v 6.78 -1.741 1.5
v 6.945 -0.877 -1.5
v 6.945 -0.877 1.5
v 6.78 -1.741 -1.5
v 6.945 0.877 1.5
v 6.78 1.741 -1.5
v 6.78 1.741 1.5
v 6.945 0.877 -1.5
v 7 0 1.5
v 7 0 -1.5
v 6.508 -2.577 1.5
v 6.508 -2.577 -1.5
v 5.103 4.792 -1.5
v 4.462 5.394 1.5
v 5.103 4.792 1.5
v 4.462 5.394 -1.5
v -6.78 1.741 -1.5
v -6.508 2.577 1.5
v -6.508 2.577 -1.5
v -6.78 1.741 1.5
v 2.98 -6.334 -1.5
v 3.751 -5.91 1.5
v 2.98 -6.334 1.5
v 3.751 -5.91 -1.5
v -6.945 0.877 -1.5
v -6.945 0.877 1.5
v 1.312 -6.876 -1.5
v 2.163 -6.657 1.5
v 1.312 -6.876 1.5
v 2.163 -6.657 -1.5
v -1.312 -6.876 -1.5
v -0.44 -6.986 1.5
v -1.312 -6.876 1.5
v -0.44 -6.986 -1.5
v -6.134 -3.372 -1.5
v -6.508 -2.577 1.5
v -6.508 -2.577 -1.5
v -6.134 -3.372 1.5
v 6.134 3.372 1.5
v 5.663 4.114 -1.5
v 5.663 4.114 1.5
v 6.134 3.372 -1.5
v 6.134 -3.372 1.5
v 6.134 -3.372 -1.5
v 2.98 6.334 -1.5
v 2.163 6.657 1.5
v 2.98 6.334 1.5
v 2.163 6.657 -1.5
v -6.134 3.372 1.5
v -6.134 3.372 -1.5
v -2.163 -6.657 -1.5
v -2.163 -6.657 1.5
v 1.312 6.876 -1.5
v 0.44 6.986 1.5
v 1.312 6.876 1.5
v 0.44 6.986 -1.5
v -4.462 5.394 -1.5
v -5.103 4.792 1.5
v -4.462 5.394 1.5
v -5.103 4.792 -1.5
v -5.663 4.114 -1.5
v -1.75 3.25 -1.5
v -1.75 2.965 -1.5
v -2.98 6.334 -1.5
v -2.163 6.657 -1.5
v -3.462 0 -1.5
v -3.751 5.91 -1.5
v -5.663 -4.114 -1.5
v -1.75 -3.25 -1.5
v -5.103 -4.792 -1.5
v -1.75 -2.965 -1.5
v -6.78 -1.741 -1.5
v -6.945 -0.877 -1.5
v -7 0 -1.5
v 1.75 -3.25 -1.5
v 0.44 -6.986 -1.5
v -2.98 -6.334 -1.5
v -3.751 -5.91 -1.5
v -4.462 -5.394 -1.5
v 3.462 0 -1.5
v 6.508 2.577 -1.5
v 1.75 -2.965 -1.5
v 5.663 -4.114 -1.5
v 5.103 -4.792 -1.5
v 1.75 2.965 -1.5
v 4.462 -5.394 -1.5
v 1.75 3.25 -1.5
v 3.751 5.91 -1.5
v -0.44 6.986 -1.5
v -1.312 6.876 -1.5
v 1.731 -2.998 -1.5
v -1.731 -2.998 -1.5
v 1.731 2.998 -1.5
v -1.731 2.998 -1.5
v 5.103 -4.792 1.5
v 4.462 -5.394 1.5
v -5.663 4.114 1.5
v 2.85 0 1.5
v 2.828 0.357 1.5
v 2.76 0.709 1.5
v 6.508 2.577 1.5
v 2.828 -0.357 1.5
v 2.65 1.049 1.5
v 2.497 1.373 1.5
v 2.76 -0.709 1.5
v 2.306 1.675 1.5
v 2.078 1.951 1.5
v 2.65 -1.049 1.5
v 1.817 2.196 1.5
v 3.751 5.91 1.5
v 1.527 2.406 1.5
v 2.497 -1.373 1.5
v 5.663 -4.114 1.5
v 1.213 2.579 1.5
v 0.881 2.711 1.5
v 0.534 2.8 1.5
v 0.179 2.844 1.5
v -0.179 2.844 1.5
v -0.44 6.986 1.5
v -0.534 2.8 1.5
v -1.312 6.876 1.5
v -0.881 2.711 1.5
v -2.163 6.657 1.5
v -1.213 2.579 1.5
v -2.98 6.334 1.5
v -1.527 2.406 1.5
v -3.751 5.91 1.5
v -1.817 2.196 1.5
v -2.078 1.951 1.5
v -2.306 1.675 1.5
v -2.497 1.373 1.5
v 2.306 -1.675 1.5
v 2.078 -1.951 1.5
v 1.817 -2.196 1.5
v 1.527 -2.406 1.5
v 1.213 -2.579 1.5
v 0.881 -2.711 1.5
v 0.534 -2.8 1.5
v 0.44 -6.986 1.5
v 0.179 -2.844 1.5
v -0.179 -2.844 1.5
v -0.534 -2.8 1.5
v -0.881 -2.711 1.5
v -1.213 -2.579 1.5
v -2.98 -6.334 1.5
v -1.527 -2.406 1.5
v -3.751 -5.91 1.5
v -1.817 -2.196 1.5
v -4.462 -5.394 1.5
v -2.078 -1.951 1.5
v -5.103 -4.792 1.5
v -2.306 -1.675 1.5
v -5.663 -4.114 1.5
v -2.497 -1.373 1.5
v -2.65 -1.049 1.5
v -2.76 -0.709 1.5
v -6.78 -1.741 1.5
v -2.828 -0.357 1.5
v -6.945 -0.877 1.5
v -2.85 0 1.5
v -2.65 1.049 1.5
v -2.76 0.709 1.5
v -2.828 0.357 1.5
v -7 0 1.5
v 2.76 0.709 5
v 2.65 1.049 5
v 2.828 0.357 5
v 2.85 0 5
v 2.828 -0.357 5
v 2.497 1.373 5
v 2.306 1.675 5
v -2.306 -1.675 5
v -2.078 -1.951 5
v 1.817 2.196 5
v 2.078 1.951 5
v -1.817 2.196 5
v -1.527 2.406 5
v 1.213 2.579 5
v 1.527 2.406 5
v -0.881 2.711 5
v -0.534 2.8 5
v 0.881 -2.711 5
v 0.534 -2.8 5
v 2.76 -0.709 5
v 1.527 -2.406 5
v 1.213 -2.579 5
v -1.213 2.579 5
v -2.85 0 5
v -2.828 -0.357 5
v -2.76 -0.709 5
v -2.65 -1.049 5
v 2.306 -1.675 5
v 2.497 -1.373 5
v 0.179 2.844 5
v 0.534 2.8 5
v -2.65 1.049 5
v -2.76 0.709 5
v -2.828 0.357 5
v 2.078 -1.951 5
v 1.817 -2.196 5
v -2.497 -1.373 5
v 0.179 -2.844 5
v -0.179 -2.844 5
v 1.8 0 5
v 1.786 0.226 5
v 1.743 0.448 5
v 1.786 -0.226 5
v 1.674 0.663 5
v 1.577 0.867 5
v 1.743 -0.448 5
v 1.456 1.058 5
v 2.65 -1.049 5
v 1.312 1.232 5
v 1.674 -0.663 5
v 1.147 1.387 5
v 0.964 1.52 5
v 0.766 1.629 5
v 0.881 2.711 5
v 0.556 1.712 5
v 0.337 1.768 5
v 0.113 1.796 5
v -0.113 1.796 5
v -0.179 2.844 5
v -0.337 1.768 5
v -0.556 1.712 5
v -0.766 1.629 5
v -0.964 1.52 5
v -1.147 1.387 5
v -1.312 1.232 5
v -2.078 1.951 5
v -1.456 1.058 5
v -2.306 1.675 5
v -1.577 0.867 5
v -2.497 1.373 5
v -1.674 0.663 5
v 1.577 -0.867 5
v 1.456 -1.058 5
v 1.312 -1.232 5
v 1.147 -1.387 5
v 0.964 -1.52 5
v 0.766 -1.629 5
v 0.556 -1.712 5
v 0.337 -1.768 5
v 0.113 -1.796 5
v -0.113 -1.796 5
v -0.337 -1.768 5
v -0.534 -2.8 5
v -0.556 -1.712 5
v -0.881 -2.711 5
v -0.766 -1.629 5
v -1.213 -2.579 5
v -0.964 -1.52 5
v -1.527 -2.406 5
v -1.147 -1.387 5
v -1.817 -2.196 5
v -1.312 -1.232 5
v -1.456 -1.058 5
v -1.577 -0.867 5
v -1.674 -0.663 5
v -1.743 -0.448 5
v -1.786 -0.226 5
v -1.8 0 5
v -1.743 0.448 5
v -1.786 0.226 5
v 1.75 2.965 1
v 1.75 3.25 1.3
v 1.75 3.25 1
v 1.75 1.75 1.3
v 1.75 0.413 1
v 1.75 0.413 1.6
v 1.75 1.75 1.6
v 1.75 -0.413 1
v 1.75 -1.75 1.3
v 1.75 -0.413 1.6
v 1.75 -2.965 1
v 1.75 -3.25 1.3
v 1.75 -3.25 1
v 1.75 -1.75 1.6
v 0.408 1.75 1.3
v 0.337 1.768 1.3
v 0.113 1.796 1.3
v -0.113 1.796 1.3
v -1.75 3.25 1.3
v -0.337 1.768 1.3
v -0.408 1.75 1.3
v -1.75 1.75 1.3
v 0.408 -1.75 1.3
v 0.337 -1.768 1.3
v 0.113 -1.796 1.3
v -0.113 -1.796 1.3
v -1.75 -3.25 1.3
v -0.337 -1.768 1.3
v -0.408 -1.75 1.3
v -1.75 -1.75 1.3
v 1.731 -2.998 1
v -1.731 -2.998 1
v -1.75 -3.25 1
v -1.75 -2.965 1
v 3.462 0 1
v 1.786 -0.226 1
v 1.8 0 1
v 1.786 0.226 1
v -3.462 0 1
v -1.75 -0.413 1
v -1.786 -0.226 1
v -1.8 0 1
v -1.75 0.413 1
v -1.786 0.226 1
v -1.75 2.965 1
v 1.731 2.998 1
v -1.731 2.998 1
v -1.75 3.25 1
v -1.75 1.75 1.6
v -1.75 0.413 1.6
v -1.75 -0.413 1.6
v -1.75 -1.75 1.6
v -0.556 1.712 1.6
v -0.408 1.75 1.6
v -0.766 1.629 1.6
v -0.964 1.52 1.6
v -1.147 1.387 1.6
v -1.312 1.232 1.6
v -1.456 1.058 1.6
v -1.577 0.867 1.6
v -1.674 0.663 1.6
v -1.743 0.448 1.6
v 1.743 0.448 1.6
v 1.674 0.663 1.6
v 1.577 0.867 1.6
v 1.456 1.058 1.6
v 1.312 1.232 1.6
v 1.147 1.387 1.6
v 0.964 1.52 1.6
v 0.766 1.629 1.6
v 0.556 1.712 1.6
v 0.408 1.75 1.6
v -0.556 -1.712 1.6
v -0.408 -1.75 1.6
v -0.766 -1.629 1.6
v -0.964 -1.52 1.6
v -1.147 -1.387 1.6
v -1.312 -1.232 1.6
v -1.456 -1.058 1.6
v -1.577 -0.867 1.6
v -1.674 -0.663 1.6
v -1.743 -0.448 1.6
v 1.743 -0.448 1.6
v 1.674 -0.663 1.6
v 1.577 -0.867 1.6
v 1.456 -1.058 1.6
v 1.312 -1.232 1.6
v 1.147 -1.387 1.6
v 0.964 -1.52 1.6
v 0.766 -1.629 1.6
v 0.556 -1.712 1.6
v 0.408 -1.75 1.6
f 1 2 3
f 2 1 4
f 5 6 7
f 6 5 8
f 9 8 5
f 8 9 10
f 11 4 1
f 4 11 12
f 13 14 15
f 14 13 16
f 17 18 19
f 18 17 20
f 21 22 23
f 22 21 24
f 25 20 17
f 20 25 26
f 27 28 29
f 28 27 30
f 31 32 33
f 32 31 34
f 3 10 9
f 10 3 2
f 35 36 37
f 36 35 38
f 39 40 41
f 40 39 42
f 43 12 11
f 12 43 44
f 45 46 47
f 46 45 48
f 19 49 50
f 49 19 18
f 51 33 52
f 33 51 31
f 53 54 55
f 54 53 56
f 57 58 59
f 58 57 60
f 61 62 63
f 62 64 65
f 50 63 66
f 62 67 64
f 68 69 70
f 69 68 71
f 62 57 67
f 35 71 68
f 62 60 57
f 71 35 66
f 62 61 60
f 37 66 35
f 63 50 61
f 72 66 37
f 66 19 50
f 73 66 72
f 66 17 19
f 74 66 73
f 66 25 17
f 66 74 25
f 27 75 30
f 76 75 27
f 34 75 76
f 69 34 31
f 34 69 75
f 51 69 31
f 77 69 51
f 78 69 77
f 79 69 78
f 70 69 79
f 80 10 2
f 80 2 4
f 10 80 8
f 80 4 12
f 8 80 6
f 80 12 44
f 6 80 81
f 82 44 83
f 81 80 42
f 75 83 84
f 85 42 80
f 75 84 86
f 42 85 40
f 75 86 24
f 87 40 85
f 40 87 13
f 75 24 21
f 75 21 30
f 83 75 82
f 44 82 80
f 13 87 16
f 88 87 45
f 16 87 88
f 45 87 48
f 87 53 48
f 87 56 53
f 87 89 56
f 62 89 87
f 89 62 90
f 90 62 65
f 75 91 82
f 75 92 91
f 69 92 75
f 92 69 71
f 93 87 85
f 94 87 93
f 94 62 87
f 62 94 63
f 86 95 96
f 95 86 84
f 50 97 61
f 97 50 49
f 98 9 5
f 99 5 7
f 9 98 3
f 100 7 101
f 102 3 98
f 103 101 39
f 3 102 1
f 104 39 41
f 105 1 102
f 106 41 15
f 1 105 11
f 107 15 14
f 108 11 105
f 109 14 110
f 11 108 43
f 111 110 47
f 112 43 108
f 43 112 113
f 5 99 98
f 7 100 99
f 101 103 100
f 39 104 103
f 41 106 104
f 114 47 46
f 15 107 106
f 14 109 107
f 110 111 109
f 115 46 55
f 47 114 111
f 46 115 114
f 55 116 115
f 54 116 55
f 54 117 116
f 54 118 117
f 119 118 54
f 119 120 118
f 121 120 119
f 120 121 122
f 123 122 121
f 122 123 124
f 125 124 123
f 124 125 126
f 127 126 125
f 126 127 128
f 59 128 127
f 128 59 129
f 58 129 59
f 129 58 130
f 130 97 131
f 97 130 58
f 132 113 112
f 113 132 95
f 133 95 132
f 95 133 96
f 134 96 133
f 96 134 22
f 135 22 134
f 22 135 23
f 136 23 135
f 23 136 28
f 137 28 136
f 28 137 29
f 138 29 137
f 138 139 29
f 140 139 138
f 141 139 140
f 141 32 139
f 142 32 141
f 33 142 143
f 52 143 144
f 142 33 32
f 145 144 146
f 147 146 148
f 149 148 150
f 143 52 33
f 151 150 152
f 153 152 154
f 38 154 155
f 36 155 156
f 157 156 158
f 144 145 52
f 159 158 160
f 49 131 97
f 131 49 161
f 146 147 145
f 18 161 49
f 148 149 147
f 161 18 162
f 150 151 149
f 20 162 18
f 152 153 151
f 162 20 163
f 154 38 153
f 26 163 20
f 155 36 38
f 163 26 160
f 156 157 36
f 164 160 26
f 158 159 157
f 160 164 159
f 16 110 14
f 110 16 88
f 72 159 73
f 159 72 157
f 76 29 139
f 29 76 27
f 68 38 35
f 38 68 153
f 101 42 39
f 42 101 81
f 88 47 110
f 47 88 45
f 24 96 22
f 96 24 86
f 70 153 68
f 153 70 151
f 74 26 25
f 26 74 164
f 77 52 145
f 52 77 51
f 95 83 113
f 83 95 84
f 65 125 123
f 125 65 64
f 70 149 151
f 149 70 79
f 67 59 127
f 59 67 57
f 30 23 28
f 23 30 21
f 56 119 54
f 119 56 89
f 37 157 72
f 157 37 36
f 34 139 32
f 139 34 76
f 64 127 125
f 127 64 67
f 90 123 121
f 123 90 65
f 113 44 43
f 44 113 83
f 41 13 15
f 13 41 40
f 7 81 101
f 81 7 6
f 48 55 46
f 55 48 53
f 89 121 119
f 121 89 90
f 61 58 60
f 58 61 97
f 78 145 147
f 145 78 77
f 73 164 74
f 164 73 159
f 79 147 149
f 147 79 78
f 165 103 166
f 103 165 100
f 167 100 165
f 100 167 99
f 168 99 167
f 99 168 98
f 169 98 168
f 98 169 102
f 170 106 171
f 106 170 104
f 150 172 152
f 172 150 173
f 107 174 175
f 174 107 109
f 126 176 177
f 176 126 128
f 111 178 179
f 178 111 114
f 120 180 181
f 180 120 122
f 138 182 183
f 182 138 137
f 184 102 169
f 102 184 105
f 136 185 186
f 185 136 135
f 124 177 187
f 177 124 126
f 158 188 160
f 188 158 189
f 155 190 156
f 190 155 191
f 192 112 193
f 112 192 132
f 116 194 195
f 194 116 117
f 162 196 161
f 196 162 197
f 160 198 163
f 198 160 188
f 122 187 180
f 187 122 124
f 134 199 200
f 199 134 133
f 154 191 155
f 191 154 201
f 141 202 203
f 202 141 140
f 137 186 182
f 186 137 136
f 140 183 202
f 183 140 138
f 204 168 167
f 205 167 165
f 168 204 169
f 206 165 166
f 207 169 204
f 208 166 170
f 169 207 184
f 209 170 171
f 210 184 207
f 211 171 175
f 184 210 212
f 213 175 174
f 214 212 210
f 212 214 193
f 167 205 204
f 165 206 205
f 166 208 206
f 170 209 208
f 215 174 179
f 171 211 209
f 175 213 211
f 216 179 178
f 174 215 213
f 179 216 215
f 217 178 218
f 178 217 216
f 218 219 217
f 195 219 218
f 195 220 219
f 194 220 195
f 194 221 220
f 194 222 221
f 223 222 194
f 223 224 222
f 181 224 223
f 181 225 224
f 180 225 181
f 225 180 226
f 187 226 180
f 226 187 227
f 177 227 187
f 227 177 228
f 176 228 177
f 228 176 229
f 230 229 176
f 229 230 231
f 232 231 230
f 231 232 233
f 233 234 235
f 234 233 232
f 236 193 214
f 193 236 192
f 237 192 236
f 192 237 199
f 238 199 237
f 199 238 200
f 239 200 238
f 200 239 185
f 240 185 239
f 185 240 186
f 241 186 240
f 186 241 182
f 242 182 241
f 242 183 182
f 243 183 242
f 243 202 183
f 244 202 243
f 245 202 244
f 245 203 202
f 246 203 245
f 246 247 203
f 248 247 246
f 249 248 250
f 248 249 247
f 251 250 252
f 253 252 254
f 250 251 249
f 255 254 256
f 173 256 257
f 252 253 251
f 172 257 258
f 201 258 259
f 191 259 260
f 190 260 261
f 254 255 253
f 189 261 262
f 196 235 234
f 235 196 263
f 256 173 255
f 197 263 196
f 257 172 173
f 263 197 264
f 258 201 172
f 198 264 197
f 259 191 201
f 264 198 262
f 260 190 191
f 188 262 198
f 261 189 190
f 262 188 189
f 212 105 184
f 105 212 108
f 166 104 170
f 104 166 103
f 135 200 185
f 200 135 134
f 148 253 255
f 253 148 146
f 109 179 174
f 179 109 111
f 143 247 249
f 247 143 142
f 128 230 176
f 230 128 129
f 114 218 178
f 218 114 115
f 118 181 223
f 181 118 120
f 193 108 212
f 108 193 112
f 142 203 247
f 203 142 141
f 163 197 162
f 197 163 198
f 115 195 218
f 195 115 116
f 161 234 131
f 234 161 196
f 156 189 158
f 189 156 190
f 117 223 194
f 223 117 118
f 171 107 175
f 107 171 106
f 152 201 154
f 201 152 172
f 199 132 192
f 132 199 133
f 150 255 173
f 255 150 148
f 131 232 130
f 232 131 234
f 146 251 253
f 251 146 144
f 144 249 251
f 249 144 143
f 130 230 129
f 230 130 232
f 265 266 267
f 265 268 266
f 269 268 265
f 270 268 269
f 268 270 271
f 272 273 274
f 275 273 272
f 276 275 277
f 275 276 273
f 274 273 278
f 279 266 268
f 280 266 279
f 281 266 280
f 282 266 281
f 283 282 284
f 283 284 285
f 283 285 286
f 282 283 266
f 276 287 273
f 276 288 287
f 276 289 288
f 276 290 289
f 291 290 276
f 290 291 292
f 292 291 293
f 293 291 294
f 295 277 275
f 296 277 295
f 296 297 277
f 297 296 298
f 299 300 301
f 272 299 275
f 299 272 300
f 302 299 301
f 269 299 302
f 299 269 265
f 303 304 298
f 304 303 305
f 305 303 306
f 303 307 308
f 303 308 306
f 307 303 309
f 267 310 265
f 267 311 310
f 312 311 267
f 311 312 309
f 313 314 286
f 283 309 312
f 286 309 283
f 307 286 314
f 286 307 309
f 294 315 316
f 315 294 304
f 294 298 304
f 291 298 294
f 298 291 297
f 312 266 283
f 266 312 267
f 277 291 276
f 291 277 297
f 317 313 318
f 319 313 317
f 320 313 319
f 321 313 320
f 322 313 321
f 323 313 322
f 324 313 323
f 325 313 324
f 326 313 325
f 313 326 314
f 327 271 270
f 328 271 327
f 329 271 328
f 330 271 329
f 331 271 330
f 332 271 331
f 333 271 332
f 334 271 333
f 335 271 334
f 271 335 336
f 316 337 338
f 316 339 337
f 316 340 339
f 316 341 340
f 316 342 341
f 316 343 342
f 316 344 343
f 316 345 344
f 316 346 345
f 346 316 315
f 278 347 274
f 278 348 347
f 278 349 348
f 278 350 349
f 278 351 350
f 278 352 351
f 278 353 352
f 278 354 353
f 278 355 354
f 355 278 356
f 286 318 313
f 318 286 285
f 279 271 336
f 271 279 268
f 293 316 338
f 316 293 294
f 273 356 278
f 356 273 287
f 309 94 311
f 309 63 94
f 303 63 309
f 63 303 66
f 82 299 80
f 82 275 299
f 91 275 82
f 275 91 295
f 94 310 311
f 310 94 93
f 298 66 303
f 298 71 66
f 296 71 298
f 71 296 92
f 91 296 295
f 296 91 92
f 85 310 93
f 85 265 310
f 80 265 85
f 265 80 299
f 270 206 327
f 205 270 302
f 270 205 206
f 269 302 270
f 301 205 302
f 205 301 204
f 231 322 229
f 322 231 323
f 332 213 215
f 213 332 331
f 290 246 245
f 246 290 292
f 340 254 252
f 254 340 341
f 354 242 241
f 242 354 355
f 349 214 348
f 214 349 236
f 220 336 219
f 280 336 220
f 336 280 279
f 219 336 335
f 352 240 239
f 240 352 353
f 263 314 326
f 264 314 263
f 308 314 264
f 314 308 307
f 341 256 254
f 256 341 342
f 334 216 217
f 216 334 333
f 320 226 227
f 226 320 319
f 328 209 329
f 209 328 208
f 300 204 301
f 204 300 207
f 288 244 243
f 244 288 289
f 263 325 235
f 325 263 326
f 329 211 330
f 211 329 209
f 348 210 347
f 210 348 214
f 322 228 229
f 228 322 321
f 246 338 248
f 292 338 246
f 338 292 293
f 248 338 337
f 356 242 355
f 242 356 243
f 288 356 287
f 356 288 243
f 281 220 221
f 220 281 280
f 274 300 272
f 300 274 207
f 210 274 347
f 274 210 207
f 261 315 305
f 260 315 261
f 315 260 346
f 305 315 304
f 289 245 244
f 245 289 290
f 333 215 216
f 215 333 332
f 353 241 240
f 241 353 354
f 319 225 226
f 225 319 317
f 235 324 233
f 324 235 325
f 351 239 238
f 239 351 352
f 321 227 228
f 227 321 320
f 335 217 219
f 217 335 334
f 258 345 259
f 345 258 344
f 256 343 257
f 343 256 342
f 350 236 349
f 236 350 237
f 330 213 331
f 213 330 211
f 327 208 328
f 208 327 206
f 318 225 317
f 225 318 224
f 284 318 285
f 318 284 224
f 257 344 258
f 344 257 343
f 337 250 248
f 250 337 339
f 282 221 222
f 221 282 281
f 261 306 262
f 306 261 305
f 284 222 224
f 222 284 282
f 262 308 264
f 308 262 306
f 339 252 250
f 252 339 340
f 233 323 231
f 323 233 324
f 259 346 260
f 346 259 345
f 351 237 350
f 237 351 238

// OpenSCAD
$fn = 50;


difference() {
	union() {
		translate(v = [0, 0, -1.5000000000]) {
			cylinder(h = 3, r = 7.0000000000);
		}
		translate(v = [0, 0, -1.5000000000]) {
			cylinder(h = 6.5000000000, r = 2.8500000000);
		}
	}
	union() {
		translate(v = [0, 0, -1.5000000000]) {
			rotate(a = [0, 0, 0]) {
				difference() {
					union() {
						translate(v = [-1.7500000000, -3.2500000000, -0.3000000000]) {
							cube(size = [3.5000000000, 6.5000000000, 0.3000000000]);
						}
						translate(v = [-1.7500000000, -1.7500000000, -0.6000000000]) {
							cube(size = [3.5000000000, 3.5000000000, 0.3000000000]);
						}
						translate(v = [-1.7500000000, -3.2500000000, 2.5000000000]) {
							cube(size = [3.5000000000, 6.5000000000, 0.3000000000]);
						}
						translate(v = [-1.7500000000, -1.7500000000, 2.8000000000]) {
							cube(size = [3.5000000000, 3.5000000000, 0.3000000000]);
						}
						linear_extrude(height = 2.5000000000) {
							polygon(points = [[3.4620000000, 0.0000000000], [1.7310000000, 2.9981799479], [-1.7310000000, 2.9981799479], [-3.4620000000, 0.0000000000], [-1.7310000000, -2.9981799479], [1.7310000000, -2.9981799479]]);
						}
						translate(v = [-1.7500000000, -3.2500000000, -0.3000000000]) {
							cube(size = [3.5000000000, 6.5000000000, 0.3000000000]);
						}
						translate(v = [-1.7500000000, -1.7500000000, -0.6000000000]) {
							cube(size = [3.5000000000, 3.5000000000, 0.3000000000]);
						}
						translate(v = [-1.7500000000, -3.2500000000, 2.5000000000]) {
							cube(size = [3.5000000000, 6.5000000000, 0.3000000000]);
						}
						translate(v = [-1.7500000000, -1.7500000000, 2.8000000000]) {
							cube(size = [3.5000000000, 3.5000000000, 0.3000000000]);
						}
						translate(v = [-1.7500000000, -3.2500000000, -0.3000000000]) {
							cube(size = [3.5000000000, 6.5000000000, 0.3000000000]);
						}
						translate(v = [-1.7500000000, -1.7500000000, -0.6000000000]) {
							cube(size = [3.5000000000, 3.5000000000, 0.3000000000]);
						}
						translate(v = [-1.7500000000, -3.2500000000, 2.5000000000]) {
							cube(size = [3.5000000000, 6.5000000000, 0.3000000000]);
						}
						translate(v = [-1.7500000000, -1.7500000000, 2.8000000000]) {
							cube(size = [3.5000000000, 3.5000000000, 0.3000000000]);
						}
					}
					union();
				}
			}
		}
		translate(v = [0, 0, -100.0000000000]) {
			cylinder(h = 200, r = 1.8000000000);
		}
	}
}
